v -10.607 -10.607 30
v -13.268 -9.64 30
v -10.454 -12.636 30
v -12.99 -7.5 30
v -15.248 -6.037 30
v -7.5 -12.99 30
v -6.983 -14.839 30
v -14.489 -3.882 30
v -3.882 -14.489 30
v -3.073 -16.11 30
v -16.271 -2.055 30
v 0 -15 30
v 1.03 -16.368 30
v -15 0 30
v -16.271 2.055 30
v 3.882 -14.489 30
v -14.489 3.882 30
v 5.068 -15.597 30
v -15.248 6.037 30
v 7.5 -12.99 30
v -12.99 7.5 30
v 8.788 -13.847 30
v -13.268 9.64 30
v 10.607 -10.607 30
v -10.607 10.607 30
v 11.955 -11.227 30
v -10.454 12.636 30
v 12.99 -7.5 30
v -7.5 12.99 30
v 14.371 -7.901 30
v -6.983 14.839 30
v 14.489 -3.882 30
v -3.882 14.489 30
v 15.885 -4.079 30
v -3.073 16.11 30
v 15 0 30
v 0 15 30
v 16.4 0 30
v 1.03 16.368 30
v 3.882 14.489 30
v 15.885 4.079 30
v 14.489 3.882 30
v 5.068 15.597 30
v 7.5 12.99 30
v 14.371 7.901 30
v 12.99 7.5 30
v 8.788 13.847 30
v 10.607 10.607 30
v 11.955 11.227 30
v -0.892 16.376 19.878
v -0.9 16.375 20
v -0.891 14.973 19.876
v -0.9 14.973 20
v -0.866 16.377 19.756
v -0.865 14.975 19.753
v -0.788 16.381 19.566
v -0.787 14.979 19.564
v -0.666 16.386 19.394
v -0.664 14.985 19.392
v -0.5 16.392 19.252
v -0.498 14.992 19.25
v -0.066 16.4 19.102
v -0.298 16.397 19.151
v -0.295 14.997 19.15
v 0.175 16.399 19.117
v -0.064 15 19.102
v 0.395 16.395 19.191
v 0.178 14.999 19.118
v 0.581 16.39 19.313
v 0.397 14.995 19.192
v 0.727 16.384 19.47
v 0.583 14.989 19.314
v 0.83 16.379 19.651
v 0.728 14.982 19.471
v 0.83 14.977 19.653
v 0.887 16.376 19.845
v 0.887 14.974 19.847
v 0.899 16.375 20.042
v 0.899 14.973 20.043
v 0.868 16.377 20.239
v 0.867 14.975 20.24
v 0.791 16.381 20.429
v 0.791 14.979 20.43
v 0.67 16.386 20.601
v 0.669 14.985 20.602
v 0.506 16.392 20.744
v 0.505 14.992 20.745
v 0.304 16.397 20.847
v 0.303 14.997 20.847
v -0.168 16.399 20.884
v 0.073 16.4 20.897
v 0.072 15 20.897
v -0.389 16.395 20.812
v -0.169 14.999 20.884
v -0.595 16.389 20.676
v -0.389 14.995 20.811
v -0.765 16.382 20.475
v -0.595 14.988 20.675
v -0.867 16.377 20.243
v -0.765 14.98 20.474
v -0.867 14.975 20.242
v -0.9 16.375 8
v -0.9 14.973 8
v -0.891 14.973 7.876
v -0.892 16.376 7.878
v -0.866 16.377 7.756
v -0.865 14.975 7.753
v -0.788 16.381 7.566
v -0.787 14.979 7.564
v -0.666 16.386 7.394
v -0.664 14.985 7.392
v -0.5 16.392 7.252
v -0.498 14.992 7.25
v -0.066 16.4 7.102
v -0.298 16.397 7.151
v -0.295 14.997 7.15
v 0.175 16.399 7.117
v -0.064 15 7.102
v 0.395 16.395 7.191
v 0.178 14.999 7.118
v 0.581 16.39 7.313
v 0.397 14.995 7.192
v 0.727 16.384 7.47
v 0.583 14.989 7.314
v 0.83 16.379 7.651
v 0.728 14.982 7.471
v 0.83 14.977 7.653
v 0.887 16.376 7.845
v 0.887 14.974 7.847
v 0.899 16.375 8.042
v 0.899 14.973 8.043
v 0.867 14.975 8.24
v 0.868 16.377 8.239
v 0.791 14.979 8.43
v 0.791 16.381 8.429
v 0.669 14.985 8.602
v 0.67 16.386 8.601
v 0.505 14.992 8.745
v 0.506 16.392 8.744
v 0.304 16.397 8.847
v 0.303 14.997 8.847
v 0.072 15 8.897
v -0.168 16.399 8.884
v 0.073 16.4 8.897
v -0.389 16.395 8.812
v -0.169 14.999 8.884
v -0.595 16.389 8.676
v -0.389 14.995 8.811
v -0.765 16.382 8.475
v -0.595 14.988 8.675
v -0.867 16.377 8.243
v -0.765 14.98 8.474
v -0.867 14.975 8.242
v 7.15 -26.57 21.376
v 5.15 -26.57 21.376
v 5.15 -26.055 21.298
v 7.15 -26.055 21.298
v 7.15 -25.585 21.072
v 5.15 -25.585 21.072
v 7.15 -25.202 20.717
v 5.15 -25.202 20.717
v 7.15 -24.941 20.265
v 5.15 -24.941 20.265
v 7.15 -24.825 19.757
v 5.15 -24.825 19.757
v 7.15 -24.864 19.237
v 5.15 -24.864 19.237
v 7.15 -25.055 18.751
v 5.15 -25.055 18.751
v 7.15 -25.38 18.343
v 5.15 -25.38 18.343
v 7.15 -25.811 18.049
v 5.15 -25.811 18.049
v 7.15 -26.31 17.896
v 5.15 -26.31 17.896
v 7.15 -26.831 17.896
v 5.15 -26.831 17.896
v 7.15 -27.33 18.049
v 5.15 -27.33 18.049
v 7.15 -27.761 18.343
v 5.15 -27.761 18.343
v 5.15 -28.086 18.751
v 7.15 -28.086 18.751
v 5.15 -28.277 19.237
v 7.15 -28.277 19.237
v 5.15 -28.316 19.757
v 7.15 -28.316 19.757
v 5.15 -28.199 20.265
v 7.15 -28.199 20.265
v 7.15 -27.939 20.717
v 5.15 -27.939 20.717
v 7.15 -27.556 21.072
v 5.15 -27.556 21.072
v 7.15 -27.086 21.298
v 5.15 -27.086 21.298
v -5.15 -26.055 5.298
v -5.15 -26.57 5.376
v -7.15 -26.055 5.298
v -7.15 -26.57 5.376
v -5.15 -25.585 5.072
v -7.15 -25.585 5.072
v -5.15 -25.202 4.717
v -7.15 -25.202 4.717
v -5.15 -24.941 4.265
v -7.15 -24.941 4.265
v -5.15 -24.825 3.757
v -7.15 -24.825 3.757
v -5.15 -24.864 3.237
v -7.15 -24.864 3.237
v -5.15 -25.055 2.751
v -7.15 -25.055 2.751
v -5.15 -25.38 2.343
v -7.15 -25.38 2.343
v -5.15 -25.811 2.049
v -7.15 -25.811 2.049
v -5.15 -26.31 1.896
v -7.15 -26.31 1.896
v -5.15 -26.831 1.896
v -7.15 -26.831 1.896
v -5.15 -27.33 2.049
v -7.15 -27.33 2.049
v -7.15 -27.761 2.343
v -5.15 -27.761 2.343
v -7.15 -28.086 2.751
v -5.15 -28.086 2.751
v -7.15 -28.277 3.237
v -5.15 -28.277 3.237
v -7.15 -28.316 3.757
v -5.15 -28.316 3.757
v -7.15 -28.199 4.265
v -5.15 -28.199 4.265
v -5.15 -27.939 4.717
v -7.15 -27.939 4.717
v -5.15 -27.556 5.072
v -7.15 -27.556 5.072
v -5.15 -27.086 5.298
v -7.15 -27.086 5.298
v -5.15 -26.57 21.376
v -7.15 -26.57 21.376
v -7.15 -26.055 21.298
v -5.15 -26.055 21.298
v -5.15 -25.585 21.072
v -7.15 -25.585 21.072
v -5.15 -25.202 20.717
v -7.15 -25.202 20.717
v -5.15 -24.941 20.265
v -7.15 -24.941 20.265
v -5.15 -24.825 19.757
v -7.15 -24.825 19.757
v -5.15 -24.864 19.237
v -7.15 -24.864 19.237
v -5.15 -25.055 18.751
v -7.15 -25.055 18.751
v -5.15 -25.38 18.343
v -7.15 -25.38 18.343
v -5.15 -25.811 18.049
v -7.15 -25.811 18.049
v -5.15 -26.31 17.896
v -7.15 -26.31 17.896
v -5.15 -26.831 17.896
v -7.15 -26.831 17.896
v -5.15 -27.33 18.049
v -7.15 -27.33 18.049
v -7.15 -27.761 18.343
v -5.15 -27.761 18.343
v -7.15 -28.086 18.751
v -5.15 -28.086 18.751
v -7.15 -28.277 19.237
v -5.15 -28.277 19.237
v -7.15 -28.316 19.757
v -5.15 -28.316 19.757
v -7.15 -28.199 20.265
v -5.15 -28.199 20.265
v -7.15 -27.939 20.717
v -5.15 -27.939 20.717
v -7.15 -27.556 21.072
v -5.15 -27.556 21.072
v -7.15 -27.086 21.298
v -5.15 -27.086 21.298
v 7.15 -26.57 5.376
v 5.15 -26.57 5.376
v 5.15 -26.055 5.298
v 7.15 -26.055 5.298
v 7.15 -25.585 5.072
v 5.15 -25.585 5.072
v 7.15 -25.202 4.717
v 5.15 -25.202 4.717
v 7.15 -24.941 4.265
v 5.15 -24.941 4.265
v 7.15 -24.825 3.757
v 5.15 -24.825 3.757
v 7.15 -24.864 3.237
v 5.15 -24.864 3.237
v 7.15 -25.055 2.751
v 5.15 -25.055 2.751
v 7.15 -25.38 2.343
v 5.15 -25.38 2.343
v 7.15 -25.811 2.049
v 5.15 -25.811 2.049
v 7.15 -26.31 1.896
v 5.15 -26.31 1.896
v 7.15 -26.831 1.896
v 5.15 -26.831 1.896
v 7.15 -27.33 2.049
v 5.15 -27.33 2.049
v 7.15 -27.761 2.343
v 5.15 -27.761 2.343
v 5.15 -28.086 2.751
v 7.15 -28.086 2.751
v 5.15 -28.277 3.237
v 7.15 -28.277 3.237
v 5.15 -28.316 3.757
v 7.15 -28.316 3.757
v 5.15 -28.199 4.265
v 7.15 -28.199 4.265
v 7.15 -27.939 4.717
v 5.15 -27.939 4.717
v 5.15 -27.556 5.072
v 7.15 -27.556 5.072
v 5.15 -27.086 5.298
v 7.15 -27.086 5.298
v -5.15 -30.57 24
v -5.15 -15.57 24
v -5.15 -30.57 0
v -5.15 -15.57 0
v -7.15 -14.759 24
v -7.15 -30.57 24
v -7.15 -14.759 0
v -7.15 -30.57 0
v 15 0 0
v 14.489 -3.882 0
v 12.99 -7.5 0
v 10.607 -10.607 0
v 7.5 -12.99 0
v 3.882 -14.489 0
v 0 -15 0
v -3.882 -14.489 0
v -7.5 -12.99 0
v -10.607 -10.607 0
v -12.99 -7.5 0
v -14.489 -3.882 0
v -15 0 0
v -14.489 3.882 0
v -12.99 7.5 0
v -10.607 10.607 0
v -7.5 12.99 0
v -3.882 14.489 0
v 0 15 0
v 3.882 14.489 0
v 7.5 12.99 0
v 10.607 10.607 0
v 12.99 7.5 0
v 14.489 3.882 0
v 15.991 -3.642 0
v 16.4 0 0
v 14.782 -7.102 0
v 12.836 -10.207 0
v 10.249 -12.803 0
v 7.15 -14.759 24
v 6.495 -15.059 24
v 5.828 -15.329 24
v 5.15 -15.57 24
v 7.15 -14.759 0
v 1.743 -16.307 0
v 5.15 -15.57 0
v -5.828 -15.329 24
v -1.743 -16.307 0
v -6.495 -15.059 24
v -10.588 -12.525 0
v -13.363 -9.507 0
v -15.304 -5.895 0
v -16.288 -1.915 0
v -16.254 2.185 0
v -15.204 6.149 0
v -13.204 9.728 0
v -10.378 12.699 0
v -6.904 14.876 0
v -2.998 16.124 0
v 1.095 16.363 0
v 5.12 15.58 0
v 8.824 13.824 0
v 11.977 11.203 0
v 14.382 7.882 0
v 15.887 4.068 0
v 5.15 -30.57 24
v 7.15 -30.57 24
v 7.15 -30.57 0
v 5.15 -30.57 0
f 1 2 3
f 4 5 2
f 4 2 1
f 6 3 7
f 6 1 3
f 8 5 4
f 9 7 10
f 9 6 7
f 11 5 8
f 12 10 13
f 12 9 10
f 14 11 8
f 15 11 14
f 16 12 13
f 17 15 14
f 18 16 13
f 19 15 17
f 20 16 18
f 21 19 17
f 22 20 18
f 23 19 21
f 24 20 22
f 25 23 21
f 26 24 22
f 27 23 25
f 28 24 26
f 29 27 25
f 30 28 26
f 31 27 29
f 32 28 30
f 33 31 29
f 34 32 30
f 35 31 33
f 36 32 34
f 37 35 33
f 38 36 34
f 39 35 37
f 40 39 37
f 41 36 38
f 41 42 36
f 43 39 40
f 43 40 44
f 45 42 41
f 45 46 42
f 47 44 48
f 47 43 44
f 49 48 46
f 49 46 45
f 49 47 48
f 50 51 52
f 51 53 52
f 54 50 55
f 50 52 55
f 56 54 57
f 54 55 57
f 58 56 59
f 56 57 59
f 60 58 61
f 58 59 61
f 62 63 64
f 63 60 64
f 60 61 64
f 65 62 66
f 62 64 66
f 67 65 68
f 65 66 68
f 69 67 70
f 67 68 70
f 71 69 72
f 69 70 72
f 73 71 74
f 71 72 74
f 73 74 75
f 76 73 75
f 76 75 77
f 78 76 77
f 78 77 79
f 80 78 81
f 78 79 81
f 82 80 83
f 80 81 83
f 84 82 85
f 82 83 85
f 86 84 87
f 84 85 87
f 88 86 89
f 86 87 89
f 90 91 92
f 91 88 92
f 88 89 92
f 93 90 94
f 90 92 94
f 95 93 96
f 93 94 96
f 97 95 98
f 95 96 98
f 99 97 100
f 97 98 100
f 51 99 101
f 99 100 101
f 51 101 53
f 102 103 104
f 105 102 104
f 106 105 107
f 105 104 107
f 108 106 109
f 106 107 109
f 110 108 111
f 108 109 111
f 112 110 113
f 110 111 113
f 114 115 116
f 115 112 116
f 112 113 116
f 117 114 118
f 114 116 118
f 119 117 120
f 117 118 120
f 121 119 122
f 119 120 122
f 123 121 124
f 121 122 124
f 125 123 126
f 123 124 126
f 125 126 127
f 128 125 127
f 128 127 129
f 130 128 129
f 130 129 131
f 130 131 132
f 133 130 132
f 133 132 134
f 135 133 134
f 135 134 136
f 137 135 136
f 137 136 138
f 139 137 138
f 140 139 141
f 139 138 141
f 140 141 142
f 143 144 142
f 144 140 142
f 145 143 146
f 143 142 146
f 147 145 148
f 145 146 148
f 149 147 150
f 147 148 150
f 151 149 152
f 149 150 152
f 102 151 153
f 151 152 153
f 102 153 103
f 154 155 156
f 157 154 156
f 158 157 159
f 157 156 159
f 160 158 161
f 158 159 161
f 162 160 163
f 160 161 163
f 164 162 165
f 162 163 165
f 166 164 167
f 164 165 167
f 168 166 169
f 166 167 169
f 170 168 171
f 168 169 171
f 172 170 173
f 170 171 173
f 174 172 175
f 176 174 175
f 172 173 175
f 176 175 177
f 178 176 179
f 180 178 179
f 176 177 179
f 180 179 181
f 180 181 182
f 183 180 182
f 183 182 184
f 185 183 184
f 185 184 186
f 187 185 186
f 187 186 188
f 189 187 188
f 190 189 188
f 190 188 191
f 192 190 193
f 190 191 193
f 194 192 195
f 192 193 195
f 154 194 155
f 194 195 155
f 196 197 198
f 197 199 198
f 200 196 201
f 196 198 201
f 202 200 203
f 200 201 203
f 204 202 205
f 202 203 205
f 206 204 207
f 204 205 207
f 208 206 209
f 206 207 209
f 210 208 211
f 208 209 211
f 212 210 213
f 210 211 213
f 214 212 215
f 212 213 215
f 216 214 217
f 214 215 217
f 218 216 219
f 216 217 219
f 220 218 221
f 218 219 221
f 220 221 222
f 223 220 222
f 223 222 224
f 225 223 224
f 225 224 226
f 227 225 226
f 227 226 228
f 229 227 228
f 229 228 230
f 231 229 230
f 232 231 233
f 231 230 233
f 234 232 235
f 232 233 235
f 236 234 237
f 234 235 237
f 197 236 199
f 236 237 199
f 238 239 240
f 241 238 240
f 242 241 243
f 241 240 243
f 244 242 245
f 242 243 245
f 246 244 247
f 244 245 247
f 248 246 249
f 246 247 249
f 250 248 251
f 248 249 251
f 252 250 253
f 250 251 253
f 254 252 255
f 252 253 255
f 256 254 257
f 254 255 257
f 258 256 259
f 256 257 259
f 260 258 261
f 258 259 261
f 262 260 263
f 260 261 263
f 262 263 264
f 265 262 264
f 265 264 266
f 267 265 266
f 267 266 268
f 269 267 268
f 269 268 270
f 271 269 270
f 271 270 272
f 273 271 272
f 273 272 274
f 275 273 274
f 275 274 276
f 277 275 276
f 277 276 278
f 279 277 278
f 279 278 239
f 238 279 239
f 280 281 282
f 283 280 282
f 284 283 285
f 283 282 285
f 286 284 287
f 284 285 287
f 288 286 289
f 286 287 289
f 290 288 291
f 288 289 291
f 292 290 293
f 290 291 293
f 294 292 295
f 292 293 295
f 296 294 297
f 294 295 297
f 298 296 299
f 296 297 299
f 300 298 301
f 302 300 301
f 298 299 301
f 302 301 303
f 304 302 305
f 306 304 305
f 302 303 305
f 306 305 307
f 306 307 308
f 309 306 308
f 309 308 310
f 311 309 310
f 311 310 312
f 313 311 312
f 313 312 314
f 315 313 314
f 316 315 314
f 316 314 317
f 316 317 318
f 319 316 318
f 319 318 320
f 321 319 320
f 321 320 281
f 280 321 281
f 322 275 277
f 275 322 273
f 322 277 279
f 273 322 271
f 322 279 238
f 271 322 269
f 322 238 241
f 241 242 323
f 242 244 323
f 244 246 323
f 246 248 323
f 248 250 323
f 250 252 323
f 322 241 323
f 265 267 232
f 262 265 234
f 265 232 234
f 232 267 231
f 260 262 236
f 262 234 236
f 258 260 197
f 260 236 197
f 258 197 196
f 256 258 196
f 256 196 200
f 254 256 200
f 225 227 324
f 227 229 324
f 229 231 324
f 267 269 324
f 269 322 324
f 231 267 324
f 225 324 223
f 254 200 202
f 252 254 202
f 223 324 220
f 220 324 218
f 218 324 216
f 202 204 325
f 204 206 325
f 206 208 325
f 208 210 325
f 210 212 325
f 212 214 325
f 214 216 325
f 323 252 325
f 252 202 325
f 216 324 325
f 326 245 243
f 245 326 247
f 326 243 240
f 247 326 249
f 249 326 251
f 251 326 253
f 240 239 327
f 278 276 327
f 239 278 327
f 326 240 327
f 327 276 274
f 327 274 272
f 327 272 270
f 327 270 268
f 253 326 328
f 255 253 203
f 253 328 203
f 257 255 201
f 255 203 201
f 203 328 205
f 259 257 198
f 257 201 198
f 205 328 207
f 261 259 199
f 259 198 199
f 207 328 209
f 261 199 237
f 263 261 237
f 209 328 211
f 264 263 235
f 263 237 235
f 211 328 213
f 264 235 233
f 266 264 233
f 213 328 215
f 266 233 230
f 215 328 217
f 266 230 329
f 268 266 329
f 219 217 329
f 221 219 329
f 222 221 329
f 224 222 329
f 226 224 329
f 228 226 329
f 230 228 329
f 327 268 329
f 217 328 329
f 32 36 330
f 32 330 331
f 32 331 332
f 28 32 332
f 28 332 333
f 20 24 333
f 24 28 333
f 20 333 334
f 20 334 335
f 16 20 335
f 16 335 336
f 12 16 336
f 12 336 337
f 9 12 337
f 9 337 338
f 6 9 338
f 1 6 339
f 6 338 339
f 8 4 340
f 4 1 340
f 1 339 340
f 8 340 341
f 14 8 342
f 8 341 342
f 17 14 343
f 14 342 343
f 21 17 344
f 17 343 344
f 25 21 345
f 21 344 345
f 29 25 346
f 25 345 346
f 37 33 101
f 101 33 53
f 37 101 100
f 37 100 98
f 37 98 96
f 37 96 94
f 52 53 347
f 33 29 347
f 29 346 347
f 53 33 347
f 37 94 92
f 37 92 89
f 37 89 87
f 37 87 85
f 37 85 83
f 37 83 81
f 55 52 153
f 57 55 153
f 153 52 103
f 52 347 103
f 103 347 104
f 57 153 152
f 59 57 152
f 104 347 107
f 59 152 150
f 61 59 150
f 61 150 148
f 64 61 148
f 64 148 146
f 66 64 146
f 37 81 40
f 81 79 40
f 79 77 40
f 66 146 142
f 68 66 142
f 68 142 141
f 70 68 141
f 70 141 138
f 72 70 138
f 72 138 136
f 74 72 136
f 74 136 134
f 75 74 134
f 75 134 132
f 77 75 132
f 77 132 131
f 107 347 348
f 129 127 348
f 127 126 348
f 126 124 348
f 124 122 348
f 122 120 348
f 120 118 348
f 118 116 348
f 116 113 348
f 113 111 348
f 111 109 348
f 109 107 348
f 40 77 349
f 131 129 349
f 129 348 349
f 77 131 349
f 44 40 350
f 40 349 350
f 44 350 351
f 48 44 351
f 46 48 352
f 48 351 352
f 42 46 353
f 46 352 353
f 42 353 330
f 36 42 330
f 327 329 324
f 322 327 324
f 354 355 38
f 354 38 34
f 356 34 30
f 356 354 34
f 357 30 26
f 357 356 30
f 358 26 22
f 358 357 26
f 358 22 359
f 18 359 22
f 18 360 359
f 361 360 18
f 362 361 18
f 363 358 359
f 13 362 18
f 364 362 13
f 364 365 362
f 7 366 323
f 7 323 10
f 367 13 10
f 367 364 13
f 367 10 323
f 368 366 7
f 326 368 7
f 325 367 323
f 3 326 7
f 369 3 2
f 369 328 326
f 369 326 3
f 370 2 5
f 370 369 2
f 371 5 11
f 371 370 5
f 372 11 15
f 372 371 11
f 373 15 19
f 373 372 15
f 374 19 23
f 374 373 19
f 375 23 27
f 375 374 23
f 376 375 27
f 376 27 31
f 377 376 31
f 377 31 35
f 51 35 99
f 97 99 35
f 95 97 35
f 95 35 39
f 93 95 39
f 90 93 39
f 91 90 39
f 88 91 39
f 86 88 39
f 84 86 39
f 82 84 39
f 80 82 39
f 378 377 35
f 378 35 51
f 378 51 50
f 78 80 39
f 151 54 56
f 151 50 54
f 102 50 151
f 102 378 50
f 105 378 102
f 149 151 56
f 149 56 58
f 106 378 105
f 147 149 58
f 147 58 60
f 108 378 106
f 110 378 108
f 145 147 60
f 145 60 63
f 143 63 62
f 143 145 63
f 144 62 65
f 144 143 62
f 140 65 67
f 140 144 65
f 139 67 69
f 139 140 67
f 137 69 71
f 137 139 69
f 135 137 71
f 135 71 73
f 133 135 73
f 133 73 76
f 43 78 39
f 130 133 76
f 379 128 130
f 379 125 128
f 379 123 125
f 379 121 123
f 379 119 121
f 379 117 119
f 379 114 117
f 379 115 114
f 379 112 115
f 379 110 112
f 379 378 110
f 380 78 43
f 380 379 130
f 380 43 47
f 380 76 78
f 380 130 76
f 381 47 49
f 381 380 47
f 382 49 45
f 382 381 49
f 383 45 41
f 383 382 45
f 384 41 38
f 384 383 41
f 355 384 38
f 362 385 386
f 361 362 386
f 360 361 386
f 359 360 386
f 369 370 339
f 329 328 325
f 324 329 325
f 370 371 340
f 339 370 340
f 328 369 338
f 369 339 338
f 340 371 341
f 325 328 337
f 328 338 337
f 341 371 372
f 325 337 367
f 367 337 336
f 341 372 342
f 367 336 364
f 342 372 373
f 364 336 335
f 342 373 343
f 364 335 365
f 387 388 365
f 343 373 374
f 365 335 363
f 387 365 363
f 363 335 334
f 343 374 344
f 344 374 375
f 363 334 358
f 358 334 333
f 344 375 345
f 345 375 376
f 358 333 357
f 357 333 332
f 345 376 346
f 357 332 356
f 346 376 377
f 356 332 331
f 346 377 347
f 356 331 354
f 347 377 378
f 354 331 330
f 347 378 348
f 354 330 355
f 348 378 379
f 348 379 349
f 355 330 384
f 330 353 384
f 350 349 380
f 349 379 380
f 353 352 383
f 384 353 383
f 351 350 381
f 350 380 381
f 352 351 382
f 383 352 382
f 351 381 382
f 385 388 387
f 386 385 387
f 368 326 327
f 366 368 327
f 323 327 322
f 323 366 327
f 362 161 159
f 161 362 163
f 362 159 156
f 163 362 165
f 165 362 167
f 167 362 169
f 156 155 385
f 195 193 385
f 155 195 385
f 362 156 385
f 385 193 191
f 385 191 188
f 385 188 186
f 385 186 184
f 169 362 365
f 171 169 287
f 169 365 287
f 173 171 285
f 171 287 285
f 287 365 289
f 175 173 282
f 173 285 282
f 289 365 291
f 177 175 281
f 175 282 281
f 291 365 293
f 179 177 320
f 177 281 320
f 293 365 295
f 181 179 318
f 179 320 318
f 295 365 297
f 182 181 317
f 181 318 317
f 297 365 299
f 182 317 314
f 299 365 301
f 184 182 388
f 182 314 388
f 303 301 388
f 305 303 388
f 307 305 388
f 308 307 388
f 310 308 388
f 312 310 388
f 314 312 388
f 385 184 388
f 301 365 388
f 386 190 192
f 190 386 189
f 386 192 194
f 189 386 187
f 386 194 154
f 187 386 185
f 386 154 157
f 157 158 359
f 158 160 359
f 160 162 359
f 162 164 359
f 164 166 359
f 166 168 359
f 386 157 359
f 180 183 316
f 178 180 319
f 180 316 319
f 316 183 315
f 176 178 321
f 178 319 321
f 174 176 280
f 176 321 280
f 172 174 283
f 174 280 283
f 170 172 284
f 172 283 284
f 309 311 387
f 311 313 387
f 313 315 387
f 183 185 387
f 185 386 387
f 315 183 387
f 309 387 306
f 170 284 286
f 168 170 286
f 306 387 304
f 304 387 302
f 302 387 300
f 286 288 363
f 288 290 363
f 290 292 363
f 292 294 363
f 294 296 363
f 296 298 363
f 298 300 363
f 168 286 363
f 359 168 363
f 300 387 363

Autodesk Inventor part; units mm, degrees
ref_plane "YZ Plane" through (0, 0, 0) normal (1, 0, 0) x (0, 1, 0)
ref_plane "XZ Plane" through (0, 0, 0) normal (0, 1, 0) x (-1, 0, 0)
ref_plane "XY Plane" through (0, 0, 0) normal (0, 0, 1) x (1, 0, 0)
sketch "Sketch1" plane through (0, 0, 0) normal (0, 0, 1) x (1, 0, 0)
  circle A0 centre (0, 0) radius 15
  circle A1 centre (0, 0) radius 16.4
  line L0 (-7.15, -14.7593) -> (-7.15, -30.5704)
  line L1 (-7.15, -30.5704) -> (-5.15, -30.5704)
  line L2 (-5.15, -30.5704) -> (-5.15, -15.5704)
  line L3 (5.15, -15.5704) -> (5.15, -30.5704)
  line L4 (5.15, -30.5704) -> (7.15, -30.5704)
  line L5 (7.15, -30.5704) -> (7.15, -14.7593)
  dimension "d0" = 1.4
  dimension "d1" = 30
  dimension "d2" = 2
  dimension "d3" = 10.3
  dimension "d4" = 15
extrude "Extrusion1" add sketch "Sketch1" along normal blind 30 contours A1
extrude "Extrusion3" add sketch "Sketch1" along normal blind 24 contours A1 L2 L1 L0 | L5 L4 L3 A1
sketch "Sketch2" plane through (-7.15, -30.5704, 0) normal (-1, 0, 0) x (0, 0, 1)
  circle A0 centre (3.6261, 4) radius 1.75
  circle A1 centre (19.6261, 4) radius 1.75
  line L0 (0, 0) -> (24, 0) projected
  point P0 (0, 30.5704)
  dimension "d7" = 3.5
  dimension "d8" = 3.5
  dimension "d9" = 16
  dimension "d15" = 4
extrude "Extrusion2" cut sketch "Sketch2" against normal through all
sketch "Sketch3" plane through (0, 0, 0) normal (0, 1, 0) x (-1, 0, 0)
  circle A0 centre (0, 8) radius 0.9
  circle A1 centre (0, 20) radius 0.9
  line L0 (15, 0) -> (-15, 0) projected
  point P0 (0, 0)
  point P1 (0, 0)
  dimension "d16" = 1.8
  dimension "d18" = 12
  dimension "d19" = 8
extrude "Extrusion4" cut sketch "Sketch3" along normal through all
properties part number "Pok Default Pitch Motor Mount" material "ABS Plastic"
